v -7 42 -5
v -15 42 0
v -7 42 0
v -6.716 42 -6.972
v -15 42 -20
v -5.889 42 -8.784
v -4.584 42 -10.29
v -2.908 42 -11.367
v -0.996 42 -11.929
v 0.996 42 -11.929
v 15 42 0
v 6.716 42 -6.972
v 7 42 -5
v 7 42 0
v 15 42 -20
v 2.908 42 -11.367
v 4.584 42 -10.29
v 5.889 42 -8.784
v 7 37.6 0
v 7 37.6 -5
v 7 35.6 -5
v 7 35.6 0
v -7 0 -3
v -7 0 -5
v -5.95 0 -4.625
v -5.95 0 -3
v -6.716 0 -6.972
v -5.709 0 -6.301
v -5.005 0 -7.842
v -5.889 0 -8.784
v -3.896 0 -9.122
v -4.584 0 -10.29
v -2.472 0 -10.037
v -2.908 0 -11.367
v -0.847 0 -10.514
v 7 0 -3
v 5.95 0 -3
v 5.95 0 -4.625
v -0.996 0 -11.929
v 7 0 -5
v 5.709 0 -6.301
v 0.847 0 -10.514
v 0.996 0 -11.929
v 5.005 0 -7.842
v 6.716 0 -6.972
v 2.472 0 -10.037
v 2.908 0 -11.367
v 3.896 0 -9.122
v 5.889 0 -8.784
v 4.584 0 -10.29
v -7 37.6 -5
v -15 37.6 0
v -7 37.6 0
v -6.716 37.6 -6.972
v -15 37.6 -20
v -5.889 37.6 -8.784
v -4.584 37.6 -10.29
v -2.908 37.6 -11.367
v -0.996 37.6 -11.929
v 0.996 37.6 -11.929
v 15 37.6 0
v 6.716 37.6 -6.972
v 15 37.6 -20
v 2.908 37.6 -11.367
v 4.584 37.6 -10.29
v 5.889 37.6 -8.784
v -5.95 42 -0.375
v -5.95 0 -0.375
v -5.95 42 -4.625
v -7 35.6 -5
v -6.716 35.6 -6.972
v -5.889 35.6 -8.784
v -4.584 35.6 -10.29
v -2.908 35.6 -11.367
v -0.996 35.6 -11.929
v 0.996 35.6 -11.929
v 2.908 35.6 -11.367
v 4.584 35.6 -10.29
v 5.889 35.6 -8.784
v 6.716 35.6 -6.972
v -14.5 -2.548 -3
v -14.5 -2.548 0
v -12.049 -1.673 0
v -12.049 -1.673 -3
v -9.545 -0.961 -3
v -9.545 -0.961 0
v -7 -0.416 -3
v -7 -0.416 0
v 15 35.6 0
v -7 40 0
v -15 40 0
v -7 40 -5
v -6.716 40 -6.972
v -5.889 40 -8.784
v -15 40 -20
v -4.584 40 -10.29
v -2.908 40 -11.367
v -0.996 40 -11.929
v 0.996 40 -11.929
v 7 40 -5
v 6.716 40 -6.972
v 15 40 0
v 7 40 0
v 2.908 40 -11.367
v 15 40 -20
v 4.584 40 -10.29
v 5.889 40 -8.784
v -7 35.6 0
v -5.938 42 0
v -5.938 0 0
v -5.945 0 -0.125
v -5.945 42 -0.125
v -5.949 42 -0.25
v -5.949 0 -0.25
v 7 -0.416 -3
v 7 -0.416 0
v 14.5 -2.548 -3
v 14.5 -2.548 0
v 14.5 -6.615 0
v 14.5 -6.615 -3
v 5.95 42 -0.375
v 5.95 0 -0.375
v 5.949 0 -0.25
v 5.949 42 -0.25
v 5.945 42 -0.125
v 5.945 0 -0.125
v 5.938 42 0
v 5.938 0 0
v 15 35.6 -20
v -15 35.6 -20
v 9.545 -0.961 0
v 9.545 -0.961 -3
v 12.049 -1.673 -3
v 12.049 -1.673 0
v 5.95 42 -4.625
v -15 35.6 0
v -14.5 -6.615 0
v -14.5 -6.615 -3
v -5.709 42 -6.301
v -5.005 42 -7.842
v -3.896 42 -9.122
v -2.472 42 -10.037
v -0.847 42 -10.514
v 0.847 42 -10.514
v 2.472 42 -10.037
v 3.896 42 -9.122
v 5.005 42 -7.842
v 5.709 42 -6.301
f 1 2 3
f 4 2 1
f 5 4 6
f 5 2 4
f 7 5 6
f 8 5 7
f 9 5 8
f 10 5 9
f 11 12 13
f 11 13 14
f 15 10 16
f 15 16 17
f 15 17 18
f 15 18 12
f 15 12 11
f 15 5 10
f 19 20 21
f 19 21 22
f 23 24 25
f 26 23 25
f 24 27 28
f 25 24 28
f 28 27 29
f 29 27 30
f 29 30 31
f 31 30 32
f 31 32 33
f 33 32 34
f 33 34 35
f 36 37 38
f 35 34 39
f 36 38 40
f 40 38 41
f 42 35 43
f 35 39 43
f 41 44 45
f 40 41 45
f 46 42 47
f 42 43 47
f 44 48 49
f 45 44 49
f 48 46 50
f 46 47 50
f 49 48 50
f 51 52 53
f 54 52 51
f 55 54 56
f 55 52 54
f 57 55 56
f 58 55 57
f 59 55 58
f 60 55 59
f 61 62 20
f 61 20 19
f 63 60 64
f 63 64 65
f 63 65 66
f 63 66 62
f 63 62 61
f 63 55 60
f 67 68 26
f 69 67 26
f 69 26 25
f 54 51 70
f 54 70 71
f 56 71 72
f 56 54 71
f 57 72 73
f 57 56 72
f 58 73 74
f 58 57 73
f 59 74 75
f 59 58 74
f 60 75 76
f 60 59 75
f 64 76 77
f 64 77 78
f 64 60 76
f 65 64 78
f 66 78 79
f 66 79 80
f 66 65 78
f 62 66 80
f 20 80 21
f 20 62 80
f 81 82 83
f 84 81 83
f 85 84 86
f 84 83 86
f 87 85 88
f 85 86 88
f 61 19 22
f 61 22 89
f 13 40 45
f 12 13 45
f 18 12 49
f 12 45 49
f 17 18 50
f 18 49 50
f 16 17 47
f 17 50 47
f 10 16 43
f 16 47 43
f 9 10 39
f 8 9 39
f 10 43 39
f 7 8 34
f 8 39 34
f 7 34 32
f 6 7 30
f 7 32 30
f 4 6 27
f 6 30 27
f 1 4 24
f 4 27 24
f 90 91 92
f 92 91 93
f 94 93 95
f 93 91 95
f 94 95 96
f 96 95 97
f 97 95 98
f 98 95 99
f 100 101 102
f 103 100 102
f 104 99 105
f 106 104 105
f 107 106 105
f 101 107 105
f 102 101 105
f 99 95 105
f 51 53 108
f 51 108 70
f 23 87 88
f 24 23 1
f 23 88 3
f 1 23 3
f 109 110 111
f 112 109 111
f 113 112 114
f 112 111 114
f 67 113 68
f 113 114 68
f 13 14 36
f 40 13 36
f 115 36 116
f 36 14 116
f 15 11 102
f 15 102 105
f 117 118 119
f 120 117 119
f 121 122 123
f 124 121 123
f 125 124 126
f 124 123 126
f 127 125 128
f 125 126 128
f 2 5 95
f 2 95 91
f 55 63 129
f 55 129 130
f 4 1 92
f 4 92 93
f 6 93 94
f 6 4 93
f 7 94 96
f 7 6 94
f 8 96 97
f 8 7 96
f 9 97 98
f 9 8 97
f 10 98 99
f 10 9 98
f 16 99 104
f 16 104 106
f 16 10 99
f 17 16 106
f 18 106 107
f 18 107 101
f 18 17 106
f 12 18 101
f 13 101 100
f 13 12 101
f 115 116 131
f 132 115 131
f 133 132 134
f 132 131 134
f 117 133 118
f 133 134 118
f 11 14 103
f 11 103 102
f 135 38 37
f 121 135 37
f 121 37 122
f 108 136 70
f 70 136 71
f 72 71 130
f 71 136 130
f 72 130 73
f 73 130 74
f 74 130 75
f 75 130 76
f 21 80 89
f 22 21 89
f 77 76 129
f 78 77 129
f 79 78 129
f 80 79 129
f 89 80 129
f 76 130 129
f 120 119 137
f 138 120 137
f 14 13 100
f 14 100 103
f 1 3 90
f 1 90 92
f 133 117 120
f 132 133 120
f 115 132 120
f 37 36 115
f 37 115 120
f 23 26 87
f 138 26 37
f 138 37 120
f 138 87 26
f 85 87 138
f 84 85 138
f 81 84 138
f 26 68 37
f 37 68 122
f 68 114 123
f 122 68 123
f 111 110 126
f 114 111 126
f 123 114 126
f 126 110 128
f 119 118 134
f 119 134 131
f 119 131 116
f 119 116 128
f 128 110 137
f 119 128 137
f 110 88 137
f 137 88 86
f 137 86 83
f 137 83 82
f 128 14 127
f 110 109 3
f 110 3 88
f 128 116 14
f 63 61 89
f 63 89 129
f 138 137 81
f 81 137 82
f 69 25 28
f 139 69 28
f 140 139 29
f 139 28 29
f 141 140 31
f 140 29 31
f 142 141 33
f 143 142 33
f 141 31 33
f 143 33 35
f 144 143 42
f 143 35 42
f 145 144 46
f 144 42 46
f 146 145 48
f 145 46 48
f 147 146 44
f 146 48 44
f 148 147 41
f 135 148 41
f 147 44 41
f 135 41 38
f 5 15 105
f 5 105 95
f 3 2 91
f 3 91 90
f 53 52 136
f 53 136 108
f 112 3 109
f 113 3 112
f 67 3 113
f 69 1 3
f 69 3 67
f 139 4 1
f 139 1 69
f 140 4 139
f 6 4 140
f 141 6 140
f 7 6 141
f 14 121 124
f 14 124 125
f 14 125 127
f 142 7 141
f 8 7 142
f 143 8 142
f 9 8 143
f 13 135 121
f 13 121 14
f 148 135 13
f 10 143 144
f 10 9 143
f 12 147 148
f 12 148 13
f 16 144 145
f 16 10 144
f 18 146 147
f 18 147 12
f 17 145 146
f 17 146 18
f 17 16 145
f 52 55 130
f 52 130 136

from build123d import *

# Parameters (mm, degrees)
BOSS_EXTRUDE1_DEPTH = 42
BOSS_EXTRUDE2_DEPTH = 2
BOSS_EXTRUDE3_DEPTH = 3
LPATTERN1_COUNT     = 2
LPATTERN1_PITCH     = 4.4


with BuildPart() as part:
    # Sketch1 → Boss-Extrude1 (new body)
    with BuildSketch(Plane(origin=(0, 0, 0), x_dir=(1, 0, 0), z_dir=(0, 1, 0))):
        with BuildLine():
            Line((-7, 5), (-7, 0))
            Line((-7, 0), (-5.938171015, 0))
            ThreePointArc((-5.938171015, 0), (-5.947042018, 0.18740674), (-5.95, 0.375))
            Line((-5.95, 0.375), (-5.95, 4.625))
            ThreePointArc((-5.95, 4.625), (0, 10.575), (5.95, 4.625))
            Line((5.95, 4.625), (5.95, 0.375))
            ThreePointArc((5.95, 0.375), (5.947042018, 0.18740674), (5.938171015, 0))
            Line((5.938171015, 0), (7, 0))
            Line((7, 0), (7, 5))
            ThreePointArc((7, 5), (0, 12), (-7, 5))
        make_face()
    extrude(amount=BOSS_EXTRUDE1_DEPTH)

    # Sketch3 → Boss-Extrude3 (add)
    with BuildSketch(Plane.XY):
        with BuildLine():
            Line((7, 0), (7, -0.415785079))
            ThreePointArc((7, -0.415785079), (10.802746819, -1.296496927), (14.5, -2.548237972))
            Line((14.5, -2.548237972), (14.5, -6.615283027))
            Line((14.5, -6.615283027), (-14.5, -6.615283027))
            Line((-14.5, -6.615283027), (-14.5, -2.548237972))
            ThreePointArc((-14.5, -2.548237972), (-10.802746819, -1.296496927), (-7, -0.415785079))
            Line((-7, -0.415785079), (-7, 0))
            Line((-7, 0), (7, 0))
        make_face()
    extrude(amount=-BOSS_EXTRUDE3_DEPTH)


with BuildPart() as body_2:
    # Sketch2 → Boss-Extrude2 (new body)
    with BuildSketch(Plane(origin=(0, 42, 0), x_dir=(1, 0, 0), z_dir=(0, 1, 0))):
        with BuildLine():
            Line((7, 0), (15, 0))
            Line((15, 0), (15, 20))
            Line((15, 20), (-15, 20))
            Line((-15, 20), (-15, 0))
            Line((-15, 0), (-7, 0))
            Line((-7, 0), (-7, 5))
            ThreePointArc((-7, 5), (0, 12), (7, 5))
            Line((7, 5), (7, 0))
        make_face()
    boss_extrude2 = extrude(amount=-BOSS_EXTRUDE2_DEPTH)


with BuildPart() as lpattern1_1:
    # LPattern1: Boss-Extrude2 ×2
    with Locations(*[(0, -i * LPATTERN1_PITCH, 0) for i in range(1, LPATTERN1_COUNT)]):
        add(boss_extrude2)


solid = Compound([part.part, body_2.part, lpattern1_1.part])
